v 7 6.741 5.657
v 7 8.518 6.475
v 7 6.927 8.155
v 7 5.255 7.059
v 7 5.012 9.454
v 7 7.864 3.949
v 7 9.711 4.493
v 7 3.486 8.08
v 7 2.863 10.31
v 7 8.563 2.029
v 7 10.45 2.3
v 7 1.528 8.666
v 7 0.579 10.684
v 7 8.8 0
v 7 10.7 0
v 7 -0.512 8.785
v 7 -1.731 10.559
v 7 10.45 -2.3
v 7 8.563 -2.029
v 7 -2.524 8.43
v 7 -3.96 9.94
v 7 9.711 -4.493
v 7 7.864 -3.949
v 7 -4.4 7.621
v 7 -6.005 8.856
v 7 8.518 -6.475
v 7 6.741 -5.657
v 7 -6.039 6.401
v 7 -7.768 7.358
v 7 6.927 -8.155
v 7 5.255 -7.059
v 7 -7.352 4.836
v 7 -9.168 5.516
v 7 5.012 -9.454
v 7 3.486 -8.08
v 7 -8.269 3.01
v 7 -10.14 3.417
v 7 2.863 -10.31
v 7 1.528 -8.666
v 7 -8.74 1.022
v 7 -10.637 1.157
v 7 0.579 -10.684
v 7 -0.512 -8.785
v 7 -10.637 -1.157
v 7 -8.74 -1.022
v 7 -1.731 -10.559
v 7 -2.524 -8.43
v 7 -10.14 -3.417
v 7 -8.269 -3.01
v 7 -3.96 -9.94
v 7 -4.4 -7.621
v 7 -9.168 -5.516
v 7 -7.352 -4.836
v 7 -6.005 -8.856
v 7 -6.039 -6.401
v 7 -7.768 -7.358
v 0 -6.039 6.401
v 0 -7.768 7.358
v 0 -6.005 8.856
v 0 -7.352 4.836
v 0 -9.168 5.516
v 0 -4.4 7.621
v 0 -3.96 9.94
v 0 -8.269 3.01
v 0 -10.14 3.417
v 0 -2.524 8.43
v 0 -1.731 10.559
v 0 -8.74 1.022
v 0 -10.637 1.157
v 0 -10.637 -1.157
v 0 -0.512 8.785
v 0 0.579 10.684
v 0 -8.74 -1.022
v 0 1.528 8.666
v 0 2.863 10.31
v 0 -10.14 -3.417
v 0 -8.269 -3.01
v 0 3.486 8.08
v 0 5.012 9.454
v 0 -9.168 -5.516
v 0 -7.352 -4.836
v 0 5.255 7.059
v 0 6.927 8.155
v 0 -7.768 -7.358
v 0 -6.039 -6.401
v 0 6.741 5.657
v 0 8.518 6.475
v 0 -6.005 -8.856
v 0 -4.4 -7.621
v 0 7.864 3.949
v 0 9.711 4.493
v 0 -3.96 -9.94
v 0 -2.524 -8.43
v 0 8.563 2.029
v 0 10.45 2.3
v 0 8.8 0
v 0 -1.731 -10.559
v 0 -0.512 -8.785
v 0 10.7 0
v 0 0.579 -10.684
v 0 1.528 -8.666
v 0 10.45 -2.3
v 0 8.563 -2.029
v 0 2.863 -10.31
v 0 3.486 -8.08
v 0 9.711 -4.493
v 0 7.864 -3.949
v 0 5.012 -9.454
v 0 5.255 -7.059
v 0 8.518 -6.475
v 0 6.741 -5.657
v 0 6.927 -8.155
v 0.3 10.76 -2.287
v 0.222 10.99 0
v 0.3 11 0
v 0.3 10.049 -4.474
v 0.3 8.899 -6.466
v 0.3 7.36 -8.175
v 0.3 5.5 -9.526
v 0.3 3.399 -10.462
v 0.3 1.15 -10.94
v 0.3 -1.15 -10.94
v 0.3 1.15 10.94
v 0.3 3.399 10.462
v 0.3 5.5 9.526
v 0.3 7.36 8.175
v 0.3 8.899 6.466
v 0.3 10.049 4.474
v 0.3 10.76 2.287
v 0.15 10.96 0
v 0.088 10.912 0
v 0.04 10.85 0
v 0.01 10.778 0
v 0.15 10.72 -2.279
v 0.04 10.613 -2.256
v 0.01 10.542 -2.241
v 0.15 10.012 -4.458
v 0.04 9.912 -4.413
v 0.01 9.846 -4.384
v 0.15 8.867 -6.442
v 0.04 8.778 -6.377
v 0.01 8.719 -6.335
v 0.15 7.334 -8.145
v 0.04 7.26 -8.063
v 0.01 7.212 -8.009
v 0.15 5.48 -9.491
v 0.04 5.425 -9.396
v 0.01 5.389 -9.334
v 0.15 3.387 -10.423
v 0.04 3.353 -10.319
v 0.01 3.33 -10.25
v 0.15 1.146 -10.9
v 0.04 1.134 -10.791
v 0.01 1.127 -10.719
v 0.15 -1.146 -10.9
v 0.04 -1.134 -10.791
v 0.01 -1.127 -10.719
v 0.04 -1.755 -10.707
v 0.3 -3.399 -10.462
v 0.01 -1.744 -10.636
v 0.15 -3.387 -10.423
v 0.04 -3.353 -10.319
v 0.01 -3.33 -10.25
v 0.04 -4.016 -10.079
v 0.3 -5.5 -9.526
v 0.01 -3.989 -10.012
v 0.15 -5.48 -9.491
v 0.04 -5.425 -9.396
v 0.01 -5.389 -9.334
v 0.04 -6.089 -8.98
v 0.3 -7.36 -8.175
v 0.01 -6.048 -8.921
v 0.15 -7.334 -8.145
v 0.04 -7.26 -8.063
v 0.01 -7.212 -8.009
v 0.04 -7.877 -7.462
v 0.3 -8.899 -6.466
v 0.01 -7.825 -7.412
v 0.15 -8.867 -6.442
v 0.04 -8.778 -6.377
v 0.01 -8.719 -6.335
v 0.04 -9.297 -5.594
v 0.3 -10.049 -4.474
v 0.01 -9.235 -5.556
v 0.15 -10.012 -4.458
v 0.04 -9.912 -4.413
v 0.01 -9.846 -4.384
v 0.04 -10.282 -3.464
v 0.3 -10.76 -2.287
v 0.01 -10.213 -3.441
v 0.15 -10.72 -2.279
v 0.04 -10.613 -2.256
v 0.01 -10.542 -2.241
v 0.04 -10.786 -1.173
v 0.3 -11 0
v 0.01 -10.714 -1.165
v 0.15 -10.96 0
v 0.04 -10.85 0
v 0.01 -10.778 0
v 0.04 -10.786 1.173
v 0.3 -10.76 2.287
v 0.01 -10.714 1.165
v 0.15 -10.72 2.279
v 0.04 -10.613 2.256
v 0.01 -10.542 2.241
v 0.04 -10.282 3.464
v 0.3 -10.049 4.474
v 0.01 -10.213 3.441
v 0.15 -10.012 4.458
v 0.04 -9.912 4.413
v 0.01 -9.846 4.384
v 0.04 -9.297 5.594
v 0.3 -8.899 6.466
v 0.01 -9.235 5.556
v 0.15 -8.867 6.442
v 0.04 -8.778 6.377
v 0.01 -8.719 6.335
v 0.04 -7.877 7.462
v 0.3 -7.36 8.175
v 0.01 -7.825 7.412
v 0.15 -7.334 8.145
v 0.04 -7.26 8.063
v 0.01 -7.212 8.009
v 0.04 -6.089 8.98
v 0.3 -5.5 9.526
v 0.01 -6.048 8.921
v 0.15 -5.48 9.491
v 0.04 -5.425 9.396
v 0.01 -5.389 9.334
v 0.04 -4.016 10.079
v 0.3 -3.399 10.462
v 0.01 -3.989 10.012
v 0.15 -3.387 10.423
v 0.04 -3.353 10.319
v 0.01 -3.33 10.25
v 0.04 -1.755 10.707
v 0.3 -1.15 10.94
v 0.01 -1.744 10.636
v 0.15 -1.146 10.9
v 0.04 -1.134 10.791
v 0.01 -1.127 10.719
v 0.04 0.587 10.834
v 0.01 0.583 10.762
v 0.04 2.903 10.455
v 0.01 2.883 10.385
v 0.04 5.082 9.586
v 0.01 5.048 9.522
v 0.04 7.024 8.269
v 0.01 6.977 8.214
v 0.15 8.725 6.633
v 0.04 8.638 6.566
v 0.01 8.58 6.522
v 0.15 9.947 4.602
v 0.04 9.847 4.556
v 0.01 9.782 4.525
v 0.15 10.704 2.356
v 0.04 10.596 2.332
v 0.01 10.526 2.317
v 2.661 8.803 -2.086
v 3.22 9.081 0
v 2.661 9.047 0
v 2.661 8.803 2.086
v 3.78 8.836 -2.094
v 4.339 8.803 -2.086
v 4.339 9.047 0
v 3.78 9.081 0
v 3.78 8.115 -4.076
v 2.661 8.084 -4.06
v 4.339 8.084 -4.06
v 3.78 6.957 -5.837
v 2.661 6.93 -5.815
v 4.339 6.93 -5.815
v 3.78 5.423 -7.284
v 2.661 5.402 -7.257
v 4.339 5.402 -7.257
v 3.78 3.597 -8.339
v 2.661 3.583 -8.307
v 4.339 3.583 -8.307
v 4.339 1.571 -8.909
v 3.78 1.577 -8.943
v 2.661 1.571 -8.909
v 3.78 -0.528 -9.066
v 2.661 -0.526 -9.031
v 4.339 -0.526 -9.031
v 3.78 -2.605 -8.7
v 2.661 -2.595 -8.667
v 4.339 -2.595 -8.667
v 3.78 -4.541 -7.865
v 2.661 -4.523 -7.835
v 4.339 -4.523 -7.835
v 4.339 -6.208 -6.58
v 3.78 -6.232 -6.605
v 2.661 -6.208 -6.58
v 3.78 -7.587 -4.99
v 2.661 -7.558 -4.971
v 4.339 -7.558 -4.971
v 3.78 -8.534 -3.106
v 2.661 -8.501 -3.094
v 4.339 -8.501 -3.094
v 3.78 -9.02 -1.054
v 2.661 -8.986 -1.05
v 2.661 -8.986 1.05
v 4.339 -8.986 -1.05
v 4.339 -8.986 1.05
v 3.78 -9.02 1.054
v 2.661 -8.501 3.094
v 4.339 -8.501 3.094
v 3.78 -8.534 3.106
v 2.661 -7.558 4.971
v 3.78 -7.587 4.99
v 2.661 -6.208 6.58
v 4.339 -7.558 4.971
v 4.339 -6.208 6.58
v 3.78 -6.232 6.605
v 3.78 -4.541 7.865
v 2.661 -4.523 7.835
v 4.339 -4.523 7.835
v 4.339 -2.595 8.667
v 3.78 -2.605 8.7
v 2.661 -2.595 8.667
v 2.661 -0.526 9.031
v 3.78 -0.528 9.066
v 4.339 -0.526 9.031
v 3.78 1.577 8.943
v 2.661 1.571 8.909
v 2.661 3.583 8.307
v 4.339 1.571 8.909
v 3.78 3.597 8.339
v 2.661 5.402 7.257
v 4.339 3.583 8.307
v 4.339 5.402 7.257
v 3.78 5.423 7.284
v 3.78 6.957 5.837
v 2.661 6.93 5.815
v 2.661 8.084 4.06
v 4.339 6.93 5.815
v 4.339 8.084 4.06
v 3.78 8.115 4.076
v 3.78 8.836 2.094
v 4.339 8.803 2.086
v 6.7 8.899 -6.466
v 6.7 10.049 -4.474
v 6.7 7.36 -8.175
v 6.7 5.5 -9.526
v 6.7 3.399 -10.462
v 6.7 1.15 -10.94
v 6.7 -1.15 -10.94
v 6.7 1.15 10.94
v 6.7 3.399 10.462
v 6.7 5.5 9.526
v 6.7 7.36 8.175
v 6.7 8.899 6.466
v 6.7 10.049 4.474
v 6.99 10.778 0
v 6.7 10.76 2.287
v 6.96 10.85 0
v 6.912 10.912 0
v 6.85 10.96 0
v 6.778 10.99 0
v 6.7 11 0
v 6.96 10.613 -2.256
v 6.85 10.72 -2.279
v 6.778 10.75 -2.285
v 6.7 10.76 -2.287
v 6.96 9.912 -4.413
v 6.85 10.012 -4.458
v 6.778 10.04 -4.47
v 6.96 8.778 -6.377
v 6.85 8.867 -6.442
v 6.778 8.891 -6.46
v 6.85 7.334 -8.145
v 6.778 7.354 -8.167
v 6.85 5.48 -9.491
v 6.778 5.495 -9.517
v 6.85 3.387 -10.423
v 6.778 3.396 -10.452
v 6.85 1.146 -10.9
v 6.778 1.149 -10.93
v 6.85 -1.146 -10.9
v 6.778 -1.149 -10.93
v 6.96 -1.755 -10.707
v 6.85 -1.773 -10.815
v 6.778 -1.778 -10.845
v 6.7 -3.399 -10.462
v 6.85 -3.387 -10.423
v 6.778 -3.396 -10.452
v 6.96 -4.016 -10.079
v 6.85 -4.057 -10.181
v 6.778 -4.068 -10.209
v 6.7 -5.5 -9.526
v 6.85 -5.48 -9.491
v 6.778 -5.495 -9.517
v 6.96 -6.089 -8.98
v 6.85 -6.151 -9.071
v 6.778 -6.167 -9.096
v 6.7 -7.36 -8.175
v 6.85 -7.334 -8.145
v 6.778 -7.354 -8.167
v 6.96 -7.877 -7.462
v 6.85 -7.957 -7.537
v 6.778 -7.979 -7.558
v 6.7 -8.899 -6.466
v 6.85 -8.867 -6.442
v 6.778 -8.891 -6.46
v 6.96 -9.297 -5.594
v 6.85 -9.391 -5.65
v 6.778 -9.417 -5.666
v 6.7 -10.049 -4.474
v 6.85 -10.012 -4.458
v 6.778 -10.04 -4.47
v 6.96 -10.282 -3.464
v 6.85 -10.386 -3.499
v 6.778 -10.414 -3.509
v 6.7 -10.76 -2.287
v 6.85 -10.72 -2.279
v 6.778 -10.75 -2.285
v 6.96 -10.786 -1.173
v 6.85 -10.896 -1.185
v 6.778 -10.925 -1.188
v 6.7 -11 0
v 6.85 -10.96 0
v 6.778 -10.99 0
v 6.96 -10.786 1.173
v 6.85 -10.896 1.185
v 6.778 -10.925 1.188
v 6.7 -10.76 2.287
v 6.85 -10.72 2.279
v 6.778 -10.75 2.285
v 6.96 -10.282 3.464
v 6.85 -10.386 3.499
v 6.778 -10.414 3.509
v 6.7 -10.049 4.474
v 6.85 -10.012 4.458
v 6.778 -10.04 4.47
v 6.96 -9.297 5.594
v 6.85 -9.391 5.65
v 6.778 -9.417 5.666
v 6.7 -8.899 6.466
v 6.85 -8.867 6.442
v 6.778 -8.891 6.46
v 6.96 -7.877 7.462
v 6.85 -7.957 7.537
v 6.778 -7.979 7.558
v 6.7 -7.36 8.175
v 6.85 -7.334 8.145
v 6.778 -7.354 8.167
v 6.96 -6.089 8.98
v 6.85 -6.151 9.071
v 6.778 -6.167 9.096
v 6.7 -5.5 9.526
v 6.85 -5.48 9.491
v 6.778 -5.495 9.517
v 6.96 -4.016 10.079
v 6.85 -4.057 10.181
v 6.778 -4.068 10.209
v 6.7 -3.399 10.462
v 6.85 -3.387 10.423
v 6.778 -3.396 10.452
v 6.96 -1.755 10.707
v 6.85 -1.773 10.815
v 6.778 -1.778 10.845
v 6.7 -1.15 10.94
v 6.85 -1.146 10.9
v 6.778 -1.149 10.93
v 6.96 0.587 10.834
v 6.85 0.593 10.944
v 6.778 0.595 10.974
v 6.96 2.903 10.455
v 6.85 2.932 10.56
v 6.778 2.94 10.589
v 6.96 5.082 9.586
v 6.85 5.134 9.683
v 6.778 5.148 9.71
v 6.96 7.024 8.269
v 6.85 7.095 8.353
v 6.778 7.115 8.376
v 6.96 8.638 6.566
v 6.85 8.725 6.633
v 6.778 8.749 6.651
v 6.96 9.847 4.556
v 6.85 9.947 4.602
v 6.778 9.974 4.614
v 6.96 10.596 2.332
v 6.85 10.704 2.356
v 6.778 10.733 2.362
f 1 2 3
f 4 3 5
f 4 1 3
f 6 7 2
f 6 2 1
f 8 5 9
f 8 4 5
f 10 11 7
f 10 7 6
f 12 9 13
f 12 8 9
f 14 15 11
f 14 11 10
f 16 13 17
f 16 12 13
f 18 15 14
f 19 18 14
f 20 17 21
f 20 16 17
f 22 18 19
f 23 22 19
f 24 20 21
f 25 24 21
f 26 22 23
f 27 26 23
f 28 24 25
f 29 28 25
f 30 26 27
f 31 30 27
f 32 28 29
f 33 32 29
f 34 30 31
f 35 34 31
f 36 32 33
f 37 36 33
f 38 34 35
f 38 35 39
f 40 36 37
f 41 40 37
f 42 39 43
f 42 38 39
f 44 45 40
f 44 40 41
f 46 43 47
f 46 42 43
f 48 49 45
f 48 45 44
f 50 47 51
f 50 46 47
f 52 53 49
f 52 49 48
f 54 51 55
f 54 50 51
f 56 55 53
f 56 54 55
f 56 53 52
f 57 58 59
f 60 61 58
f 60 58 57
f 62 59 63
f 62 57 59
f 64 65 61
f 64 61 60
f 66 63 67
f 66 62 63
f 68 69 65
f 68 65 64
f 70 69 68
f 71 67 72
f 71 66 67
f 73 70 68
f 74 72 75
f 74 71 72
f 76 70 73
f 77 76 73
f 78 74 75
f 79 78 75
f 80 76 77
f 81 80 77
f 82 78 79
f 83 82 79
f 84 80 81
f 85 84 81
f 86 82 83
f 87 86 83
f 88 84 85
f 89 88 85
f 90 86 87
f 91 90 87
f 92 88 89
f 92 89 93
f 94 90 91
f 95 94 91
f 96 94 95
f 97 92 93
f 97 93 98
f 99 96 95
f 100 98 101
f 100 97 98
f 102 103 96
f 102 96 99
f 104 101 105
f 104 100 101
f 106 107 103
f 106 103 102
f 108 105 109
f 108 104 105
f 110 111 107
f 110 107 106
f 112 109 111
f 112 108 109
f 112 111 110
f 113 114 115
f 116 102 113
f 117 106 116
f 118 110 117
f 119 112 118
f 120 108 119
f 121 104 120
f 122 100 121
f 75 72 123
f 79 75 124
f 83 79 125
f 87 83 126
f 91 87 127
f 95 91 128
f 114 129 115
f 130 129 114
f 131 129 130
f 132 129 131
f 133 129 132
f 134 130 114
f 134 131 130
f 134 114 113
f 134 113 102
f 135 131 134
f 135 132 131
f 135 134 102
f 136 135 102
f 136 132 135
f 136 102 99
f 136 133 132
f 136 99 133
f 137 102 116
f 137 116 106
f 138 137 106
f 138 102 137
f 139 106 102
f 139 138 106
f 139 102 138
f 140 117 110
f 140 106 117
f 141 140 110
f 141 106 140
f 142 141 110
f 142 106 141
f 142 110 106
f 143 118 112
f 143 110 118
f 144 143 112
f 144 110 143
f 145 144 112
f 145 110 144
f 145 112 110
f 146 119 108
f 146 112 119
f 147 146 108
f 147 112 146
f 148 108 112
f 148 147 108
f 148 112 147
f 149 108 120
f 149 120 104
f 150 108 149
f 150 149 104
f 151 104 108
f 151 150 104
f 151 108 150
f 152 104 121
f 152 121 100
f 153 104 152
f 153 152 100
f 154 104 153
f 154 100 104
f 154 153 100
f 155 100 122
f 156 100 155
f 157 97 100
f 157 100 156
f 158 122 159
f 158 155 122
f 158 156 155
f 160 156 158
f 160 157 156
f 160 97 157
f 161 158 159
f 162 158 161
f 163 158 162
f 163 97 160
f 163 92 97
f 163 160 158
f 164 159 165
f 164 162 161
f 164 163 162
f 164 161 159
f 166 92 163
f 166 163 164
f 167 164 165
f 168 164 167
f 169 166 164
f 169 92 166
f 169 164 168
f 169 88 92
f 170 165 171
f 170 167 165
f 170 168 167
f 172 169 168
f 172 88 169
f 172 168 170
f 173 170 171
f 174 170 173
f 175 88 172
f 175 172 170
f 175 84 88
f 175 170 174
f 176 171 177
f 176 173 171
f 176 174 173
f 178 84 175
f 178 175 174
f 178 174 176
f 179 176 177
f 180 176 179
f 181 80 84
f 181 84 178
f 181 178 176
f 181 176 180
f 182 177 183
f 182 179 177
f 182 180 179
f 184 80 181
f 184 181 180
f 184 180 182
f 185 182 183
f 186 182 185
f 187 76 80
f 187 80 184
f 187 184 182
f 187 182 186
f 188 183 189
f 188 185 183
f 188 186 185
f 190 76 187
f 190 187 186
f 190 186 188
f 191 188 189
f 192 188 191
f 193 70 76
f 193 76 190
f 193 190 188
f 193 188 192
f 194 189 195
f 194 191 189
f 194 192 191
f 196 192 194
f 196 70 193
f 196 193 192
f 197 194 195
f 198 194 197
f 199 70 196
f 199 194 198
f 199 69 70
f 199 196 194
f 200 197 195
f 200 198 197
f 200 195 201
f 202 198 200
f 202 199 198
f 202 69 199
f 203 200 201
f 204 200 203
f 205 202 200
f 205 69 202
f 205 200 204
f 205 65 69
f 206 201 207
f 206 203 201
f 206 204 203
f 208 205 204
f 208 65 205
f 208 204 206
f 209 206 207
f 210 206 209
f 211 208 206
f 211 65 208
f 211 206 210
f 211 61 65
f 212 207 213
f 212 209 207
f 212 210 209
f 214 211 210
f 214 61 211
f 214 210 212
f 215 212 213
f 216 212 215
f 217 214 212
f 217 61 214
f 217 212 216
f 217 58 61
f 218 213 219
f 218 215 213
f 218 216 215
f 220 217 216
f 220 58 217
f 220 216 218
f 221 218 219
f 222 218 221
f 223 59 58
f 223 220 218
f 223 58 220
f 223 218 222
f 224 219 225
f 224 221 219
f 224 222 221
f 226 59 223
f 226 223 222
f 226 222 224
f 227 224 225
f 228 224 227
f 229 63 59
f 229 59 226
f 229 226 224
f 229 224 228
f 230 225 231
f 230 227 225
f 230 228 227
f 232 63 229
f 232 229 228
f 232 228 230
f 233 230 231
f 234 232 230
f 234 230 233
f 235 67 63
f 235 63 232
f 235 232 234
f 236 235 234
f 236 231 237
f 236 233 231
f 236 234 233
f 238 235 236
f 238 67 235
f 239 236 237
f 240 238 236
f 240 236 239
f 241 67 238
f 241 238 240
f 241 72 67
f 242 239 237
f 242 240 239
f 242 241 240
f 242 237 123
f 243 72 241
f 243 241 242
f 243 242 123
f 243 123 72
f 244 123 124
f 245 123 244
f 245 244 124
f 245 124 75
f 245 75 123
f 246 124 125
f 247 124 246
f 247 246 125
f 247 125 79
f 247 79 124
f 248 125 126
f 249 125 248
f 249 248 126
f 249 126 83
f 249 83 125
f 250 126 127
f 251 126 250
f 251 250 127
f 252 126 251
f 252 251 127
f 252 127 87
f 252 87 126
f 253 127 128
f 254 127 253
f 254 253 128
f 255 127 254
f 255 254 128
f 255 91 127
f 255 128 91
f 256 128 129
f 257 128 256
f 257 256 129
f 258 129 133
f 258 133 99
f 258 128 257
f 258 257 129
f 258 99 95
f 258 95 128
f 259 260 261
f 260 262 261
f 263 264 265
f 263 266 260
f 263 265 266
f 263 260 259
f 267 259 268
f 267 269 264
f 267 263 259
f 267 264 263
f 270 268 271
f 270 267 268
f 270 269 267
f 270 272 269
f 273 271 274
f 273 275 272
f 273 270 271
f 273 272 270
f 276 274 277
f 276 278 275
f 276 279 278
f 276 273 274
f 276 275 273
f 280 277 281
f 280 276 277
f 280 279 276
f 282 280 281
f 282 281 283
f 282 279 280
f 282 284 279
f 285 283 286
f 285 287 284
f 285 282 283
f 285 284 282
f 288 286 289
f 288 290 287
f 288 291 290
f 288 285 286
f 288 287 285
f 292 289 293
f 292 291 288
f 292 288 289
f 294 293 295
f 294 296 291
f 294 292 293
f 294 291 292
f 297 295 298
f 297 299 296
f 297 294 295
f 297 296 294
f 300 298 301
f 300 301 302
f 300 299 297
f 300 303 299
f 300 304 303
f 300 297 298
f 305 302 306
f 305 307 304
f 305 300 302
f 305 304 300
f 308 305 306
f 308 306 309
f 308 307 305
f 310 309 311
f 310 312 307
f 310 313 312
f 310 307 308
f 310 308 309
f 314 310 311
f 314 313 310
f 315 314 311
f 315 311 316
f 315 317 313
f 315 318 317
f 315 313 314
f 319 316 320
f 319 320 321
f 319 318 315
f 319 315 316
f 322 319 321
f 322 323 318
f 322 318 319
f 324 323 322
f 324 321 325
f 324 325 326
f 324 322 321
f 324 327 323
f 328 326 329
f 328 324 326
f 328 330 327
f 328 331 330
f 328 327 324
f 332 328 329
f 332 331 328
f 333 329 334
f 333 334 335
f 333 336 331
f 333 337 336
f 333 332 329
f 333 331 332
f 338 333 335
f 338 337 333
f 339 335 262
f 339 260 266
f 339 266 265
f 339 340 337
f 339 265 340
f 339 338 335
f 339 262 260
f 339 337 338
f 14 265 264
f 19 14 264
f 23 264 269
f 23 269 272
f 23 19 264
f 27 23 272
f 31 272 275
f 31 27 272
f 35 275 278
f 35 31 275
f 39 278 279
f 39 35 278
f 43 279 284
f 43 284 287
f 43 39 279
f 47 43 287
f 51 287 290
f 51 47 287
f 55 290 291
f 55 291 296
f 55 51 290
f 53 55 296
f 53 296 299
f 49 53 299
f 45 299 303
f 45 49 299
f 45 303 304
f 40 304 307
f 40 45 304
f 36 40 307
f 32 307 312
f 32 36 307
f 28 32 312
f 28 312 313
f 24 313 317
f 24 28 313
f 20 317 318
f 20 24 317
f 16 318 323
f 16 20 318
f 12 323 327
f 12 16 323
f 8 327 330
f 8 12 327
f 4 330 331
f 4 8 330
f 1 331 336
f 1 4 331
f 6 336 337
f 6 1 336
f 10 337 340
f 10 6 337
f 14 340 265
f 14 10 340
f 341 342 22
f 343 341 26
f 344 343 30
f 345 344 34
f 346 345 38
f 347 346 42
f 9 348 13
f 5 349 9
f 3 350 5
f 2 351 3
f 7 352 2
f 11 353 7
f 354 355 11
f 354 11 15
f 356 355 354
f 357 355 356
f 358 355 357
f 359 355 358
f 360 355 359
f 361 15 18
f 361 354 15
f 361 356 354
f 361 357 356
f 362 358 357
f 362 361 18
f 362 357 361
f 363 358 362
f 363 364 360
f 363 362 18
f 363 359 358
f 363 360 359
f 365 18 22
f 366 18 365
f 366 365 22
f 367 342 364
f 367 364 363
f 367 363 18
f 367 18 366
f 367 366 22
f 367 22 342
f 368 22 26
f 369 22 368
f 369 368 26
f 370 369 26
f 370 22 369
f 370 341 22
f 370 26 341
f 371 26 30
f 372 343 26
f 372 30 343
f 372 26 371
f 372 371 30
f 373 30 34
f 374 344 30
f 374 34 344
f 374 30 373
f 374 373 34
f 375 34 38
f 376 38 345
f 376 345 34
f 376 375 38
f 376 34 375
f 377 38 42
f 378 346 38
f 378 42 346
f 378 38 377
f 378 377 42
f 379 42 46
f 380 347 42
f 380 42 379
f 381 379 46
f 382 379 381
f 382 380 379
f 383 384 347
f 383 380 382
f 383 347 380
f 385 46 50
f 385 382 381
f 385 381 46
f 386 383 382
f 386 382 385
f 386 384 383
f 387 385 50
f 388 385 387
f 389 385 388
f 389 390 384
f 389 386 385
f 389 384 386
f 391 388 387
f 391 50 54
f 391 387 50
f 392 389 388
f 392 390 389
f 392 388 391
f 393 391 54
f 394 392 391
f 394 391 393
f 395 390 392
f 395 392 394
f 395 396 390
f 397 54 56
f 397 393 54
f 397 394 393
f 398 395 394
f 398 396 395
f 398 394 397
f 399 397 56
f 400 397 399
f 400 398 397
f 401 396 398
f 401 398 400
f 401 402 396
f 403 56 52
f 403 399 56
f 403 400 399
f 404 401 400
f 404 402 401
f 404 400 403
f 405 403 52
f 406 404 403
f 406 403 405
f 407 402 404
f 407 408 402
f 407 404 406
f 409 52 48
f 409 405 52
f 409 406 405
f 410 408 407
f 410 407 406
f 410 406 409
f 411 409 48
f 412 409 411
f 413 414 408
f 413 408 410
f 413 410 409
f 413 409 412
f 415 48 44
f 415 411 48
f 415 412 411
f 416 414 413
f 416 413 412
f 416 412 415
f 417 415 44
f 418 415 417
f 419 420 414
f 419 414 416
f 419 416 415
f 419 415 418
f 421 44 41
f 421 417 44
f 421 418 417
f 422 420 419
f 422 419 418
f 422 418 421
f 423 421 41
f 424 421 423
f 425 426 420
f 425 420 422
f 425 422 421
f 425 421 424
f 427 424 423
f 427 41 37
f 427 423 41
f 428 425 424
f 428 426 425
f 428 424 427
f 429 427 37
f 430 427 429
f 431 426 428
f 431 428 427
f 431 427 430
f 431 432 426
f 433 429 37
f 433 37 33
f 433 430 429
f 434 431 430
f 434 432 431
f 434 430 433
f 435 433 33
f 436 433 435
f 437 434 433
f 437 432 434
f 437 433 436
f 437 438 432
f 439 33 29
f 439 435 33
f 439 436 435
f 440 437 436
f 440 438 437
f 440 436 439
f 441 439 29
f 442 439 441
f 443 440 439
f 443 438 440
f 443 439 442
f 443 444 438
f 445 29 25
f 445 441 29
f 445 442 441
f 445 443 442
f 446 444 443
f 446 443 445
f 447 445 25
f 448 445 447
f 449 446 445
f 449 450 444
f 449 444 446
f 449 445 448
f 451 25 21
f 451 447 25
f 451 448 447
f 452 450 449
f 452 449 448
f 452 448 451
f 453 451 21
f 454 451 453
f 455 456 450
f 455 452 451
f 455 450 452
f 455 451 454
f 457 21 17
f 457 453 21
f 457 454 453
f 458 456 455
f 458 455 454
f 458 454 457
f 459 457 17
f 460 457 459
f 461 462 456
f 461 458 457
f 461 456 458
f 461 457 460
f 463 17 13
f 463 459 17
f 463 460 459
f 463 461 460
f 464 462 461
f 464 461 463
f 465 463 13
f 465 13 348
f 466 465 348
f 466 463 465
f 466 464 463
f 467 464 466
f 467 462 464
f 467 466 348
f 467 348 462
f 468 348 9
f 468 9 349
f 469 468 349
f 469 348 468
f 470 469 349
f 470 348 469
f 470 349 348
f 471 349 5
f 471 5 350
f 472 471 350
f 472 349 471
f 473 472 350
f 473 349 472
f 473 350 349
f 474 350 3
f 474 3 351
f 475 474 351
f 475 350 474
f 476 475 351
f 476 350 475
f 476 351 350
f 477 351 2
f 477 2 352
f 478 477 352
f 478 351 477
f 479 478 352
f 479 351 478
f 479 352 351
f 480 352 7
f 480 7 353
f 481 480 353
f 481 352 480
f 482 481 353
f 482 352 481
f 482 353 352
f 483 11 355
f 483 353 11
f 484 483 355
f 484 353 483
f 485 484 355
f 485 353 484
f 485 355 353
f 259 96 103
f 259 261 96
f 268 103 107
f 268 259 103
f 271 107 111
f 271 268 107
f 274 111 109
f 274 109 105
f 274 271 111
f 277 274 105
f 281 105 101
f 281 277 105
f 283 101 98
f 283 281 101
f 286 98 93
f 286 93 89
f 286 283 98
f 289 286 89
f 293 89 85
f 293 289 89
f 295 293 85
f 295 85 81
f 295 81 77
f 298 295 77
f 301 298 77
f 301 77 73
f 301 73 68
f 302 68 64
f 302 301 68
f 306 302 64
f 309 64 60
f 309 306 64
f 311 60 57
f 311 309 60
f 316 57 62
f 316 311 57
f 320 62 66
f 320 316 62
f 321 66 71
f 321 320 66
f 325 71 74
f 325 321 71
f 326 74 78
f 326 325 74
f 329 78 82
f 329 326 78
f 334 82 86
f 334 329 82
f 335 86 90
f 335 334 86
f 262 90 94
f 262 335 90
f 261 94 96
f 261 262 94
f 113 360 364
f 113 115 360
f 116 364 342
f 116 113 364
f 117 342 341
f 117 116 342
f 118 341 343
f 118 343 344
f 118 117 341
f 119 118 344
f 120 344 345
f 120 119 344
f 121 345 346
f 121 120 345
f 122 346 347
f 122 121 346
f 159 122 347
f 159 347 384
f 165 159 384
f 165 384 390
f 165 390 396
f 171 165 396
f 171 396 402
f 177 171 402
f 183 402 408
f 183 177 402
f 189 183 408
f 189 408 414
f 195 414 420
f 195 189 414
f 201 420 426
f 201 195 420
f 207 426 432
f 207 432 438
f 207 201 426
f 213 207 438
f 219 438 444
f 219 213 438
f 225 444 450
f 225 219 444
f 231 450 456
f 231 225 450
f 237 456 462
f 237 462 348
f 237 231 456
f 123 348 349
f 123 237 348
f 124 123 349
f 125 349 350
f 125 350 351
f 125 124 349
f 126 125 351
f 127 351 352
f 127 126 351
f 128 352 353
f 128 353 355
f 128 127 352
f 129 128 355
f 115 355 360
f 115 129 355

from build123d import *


with BuildPart() as part:
    # Sketch1 → Revolve1 (revolve)
    with BuildSketch(Plane.XY):
        with BuildLine():
            Line((0, 8.8), (2.661204617, 9.046741509))
            ThreePointArc((2.661204617, 9.046741509), (3.5, 9.085544), (4.338795383, 9.046741509))
            Line((4.338795383, 9.046741509), (7, 8.8))
            Line((7, 8.8), (7, 10.7))
            ThreePointArc((7, 10.7), (6.912132034, 10.912132034), (6.7, 11))
            Line((6.7, 11), (0.3, 11))
            ThreePointArc((0.3, 11), (0.087867966, 10.912132034), (0, 10.7))
            Line((0, 10.7), (0, 8.8))
        make_face()
    revolve(axis=Axis((50, 0, 0), (-1, 0, 0)))


solid = part.part
